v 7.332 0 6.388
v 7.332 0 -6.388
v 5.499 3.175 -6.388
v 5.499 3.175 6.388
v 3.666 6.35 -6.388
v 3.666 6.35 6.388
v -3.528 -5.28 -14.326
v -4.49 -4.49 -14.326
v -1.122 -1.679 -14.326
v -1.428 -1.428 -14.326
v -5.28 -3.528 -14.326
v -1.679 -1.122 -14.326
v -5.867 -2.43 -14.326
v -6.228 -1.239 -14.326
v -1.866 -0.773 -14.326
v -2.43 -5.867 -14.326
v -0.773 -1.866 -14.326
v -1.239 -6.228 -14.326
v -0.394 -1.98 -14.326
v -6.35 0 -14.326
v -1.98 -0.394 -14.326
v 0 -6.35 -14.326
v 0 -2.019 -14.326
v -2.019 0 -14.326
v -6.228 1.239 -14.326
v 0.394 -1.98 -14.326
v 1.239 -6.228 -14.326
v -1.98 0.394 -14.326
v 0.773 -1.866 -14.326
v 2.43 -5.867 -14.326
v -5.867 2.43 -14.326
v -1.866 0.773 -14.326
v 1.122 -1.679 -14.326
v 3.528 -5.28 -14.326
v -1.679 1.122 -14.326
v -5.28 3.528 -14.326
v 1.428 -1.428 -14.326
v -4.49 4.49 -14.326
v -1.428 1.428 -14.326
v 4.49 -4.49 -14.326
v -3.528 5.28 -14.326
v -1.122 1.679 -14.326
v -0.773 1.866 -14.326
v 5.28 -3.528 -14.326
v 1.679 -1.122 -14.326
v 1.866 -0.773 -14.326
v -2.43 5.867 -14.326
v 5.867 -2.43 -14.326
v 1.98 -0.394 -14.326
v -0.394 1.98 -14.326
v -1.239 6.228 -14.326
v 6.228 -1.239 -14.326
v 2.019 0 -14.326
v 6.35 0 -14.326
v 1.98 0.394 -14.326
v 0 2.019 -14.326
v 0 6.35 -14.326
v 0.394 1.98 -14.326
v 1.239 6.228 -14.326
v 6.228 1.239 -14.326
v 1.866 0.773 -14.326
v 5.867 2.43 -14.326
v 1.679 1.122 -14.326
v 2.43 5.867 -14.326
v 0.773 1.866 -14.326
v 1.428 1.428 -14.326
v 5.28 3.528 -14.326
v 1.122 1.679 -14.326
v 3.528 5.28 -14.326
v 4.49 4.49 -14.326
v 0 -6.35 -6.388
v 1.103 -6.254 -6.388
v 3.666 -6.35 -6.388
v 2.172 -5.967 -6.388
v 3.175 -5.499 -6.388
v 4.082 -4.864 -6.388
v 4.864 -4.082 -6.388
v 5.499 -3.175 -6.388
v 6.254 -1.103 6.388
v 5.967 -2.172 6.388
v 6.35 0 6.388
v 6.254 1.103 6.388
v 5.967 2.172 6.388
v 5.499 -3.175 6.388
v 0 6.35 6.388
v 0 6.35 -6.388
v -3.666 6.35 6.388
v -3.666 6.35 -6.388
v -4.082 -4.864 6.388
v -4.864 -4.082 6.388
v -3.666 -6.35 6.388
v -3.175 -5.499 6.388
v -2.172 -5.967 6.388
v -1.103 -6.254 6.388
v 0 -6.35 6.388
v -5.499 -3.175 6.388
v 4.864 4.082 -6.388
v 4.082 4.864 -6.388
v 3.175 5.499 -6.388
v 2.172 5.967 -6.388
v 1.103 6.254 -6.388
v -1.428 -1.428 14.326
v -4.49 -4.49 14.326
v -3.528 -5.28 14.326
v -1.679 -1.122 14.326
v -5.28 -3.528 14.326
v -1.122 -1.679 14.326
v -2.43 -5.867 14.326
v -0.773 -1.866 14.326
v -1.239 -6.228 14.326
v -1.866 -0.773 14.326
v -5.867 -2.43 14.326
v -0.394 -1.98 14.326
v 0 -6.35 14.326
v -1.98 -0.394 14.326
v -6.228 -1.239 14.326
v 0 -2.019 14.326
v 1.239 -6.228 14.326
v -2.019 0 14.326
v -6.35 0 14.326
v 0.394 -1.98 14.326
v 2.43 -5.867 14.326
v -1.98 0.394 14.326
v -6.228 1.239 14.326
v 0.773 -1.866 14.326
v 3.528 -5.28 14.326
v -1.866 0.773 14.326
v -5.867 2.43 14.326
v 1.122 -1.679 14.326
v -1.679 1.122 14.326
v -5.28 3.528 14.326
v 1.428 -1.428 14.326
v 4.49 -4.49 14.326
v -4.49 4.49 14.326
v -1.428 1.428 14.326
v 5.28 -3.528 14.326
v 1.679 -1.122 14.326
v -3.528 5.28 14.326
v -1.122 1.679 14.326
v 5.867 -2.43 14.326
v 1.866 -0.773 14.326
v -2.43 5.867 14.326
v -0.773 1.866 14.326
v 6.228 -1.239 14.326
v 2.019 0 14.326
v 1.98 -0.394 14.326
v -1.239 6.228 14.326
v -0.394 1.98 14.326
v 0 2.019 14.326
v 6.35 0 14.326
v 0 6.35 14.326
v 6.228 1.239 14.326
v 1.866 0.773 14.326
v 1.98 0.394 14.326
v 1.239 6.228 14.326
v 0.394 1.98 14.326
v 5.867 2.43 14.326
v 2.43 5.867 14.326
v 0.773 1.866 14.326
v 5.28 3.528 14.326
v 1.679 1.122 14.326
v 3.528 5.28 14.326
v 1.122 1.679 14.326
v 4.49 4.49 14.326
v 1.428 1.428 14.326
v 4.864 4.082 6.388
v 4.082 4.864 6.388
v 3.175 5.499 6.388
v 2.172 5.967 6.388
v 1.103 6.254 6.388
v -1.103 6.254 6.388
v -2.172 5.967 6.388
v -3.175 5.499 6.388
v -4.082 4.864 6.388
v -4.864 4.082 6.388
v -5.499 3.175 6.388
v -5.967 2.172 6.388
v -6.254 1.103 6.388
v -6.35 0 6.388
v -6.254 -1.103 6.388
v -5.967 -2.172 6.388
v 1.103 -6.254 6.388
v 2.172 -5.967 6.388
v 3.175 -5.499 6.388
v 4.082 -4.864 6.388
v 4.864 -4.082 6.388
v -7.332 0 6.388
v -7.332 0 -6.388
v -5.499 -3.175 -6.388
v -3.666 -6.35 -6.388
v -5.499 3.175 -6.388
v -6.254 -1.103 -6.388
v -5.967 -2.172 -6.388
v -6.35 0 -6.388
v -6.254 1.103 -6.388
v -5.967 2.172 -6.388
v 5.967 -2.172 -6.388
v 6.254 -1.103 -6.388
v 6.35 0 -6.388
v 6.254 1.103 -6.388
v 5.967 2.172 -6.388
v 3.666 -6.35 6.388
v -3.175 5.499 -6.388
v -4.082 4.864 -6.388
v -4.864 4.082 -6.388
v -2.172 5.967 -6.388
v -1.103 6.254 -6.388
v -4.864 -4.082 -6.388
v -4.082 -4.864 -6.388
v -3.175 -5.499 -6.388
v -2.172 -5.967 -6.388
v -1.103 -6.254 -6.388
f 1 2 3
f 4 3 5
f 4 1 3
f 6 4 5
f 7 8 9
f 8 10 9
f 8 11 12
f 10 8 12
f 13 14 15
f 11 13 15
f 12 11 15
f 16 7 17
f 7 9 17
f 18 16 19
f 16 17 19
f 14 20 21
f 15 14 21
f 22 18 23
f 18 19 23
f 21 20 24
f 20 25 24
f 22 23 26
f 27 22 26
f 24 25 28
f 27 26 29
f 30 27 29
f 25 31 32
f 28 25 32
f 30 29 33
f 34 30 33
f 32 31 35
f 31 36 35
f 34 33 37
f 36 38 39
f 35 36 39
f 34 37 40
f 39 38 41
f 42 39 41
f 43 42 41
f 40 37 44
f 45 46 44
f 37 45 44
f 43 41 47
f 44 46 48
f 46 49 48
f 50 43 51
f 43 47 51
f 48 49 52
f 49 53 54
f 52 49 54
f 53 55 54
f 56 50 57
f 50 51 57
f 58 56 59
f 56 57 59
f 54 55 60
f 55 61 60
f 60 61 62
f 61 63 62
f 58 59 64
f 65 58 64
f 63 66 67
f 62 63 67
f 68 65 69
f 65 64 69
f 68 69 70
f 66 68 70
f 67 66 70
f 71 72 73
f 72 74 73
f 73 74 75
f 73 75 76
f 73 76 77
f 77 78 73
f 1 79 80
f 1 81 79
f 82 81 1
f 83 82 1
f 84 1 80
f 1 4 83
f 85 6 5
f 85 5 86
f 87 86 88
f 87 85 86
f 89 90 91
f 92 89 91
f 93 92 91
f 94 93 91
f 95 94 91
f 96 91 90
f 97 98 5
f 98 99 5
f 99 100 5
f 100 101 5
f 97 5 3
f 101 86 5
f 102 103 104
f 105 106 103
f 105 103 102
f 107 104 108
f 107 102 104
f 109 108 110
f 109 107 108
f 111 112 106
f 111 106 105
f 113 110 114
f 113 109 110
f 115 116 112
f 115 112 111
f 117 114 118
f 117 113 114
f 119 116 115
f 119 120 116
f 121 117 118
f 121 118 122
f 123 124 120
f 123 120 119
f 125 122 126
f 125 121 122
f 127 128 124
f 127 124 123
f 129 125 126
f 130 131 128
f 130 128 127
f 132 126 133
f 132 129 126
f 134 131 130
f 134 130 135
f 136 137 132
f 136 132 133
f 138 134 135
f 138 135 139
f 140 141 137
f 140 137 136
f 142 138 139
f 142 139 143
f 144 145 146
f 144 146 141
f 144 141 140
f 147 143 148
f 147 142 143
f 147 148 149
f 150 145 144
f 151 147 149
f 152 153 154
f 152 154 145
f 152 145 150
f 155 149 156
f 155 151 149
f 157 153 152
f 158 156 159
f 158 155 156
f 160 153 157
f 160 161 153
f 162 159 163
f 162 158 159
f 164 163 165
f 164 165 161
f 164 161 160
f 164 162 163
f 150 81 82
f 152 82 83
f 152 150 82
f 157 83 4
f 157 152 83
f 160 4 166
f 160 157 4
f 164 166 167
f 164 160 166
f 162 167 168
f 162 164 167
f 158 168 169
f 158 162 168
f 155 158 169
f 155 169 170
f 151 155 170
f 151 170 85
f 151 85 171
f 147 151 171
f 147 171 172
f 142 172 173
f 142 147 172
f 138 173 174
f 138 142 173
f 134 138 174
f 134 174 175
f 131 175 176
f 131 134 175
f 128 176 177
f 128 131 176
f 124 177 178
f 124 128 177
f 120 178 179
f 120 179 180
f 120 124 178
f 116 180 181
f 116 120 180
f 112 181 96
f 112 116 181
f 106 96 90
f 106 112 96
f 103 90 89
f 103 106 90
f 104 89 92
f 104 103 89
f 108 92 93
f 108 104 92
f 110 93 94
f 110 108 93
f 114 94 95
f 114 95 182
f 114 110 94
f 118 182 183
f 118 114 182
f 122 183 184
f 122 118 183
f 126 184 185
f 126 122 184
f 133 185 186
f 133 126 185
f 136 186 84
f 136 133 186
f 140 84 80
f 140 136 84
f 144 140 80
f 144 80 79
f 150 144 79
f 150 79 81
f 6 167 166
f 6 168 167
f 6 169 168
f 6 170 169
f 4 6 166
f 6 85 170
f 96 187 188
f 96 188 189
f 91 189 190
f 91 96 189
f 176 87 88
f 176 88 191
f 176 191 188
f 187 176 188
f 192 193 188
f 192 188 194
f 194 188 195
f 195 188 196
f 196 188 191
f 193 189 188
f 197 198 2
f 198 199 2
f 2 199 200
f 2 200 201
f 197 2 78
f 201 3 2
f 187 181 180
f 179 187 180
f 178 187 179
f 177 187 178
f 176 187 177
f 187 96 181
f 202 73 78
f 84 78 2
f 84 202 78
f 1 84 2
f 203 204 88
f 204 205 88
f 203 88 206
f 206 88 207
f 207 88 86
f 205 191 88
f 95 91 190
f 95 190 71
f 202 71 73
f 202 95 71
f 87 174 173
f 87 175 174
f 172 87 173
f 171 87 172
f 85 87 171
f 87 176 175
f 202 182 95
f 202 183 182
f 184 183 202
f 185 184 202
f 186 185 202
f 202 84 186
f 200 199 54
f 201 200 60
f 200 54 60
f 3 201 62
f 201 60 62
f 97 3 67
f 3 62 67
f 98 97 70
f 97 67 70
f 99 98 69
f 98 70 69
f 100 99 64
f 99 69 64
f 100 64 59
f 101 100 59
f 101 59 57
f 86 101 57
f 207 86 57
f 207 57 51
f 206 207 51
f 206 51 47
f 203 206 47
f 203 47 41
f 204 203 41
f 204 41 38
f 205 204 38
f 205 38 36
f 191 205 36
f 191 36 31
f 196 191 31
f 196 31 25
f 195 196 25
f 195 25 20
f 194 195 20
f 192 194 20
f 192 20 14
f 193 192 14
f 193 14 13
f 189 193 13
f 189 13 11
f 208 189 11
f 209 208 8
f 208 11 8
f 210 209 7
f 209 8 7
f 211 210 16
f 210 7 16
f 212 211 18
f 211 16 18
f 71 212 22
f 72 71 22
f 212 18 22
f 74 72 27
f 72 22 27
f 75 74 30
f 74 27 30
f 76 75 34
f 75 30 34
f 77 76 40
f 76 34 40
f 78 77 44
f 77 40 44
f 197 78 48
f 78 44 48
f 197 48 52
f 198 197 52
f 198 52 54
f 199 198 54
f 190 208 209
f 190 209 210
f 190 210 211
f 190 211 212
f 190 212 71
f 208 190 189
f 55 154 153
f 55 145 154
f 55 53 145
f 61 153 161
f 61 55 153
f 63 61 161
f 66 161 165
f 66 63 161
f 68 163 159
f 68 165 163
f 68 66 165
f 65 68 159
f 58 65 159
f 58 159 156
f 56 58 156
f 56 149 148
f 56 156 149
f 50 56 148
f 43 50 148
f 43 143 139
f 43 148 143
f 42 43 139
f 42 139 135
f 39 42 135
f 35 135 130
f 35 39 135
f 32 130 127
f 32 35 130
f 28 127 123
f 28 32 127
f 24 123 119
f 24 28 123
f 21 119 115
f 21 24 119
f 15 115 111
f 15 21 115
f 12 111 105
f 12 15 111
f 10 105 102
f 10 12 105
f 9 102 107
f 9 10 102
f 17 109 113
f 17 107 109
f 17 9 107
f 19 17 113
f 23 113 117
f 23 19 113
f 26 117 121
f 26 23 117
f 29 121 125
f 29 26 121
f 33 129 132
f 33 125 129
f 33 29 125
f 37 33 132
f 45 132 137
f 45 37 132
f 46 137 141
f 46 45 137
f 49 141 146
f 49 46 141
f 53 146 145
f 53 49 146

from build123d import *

# Parameters (mm, degrees)
SKETCH1_R                            = 2.0193
BOSS_EXTRUDE1_DEPTH                  = 14.3256
F_10_32_TAPPED_HOLE1_D               = 4.0386
F_10_32_TAPPED_HOLE1_DEPTH           = 11.938
F_10_32_TAPPED_HOLE1_TIP             = 1.213317848
F_10_32_TAPPED_HOLE1_ON_FACE_2_D     = 4.0386
F_10_32_TAPPED_HOLE1_ON_FACE_2_DEPTH = 11.938
F_10_32_TAPPED_HOLE1_ON_FACE_2_TIP   = 1.213317848
SKETCH4_R                            = 8.89
SKETCH4_R_2                          = 6.35
CUT_EXTRUDE_THIN1_DEPTH              = 7.9375


with BuildPart() as part:
    # Sketch1 → Boss-Extrude1 (new, symmetric)
    with BuildSketch(Plane.XY):
        Polygon((7.332348419, 0), (3.666174209, 6.35), (-3.666174209, 6.35), (-7.332348419, 0), (-3.666174209, -6.35), (3.666174209, -6.35), align=None)
        Circle(SKETCH1_R, mode=Mode.SUBTRACT)
    extrude(amount=BOSS_EXTRUDE1_DEPTH, both=True)

    # #10-32 Tapped Hole1
    with Locations(Plane.XY.offset(14.3256)):
        with Locations((0, 0)):
            Hole(F_10_32_TAPPED_HOLE1_D / 2, depth=F_10_32_TAPPED_HOLE1_DEPTH)
            with Locations((0, 0, -(F_10_32_TAPPED_HOLE1_DEPTH + F_10_32_TAPPED_HOLE1_TIP / 2))):  # 118° drill point
                Cone(0, F_10_32_TAPPED_HOLE1_D / 2, F_10_32_TAPPED_HOLE1_TIP, mode=Mode.SUBTRACT)

    # #10-32 Tapped Hole1 on face 2
    with Locations(Plane.XY.offset(-14.3256)):
        with Locations((0, 0)):
            Hole(F_10_32_TAPPED_HOLE1_ON_FACE_2_D / 2, depth=F_10_32_TAPPED_HOLE1_ON_FACE_2_DEPTH)
            with Locations((0, 0, -(F_10_32_TAPPED_HOLE1_ON_FACE_2_DEPTH + F_10_32_TAPPED_HOLE1_ON_FACE_2_TIP / 2))):  # 118° drill point
                Cone(0, F_10_32_TAPPED_HOLE1_ON_FACE_2_D / 2, F_10_32_TAPPED_HOLE1_ON_FACE_2_TIP, mode=Mode.SUBTRACT)

    # Sketch4 → Cut-Extrude-Thin1 (cut)
    with BuildSketch(Plane.XY.offset(14.3256)):
        Circle(SKETCH4_R)
        Circle(SKETCH4_R_2, mode=Mode.SUBTRACT)
    cut_extrude_thin1 = extrude(amount=-CUT_EXTRUDE_THIN1_DEPTH, mode=Mode.SUBTRACT)

    # Mirror1: Cut-Extrude-Thin1 across plane
    add(cut_extrude_thin1.mirror(Plane.XY), mode=Mode.SUBTRACT)


solid = part.part
